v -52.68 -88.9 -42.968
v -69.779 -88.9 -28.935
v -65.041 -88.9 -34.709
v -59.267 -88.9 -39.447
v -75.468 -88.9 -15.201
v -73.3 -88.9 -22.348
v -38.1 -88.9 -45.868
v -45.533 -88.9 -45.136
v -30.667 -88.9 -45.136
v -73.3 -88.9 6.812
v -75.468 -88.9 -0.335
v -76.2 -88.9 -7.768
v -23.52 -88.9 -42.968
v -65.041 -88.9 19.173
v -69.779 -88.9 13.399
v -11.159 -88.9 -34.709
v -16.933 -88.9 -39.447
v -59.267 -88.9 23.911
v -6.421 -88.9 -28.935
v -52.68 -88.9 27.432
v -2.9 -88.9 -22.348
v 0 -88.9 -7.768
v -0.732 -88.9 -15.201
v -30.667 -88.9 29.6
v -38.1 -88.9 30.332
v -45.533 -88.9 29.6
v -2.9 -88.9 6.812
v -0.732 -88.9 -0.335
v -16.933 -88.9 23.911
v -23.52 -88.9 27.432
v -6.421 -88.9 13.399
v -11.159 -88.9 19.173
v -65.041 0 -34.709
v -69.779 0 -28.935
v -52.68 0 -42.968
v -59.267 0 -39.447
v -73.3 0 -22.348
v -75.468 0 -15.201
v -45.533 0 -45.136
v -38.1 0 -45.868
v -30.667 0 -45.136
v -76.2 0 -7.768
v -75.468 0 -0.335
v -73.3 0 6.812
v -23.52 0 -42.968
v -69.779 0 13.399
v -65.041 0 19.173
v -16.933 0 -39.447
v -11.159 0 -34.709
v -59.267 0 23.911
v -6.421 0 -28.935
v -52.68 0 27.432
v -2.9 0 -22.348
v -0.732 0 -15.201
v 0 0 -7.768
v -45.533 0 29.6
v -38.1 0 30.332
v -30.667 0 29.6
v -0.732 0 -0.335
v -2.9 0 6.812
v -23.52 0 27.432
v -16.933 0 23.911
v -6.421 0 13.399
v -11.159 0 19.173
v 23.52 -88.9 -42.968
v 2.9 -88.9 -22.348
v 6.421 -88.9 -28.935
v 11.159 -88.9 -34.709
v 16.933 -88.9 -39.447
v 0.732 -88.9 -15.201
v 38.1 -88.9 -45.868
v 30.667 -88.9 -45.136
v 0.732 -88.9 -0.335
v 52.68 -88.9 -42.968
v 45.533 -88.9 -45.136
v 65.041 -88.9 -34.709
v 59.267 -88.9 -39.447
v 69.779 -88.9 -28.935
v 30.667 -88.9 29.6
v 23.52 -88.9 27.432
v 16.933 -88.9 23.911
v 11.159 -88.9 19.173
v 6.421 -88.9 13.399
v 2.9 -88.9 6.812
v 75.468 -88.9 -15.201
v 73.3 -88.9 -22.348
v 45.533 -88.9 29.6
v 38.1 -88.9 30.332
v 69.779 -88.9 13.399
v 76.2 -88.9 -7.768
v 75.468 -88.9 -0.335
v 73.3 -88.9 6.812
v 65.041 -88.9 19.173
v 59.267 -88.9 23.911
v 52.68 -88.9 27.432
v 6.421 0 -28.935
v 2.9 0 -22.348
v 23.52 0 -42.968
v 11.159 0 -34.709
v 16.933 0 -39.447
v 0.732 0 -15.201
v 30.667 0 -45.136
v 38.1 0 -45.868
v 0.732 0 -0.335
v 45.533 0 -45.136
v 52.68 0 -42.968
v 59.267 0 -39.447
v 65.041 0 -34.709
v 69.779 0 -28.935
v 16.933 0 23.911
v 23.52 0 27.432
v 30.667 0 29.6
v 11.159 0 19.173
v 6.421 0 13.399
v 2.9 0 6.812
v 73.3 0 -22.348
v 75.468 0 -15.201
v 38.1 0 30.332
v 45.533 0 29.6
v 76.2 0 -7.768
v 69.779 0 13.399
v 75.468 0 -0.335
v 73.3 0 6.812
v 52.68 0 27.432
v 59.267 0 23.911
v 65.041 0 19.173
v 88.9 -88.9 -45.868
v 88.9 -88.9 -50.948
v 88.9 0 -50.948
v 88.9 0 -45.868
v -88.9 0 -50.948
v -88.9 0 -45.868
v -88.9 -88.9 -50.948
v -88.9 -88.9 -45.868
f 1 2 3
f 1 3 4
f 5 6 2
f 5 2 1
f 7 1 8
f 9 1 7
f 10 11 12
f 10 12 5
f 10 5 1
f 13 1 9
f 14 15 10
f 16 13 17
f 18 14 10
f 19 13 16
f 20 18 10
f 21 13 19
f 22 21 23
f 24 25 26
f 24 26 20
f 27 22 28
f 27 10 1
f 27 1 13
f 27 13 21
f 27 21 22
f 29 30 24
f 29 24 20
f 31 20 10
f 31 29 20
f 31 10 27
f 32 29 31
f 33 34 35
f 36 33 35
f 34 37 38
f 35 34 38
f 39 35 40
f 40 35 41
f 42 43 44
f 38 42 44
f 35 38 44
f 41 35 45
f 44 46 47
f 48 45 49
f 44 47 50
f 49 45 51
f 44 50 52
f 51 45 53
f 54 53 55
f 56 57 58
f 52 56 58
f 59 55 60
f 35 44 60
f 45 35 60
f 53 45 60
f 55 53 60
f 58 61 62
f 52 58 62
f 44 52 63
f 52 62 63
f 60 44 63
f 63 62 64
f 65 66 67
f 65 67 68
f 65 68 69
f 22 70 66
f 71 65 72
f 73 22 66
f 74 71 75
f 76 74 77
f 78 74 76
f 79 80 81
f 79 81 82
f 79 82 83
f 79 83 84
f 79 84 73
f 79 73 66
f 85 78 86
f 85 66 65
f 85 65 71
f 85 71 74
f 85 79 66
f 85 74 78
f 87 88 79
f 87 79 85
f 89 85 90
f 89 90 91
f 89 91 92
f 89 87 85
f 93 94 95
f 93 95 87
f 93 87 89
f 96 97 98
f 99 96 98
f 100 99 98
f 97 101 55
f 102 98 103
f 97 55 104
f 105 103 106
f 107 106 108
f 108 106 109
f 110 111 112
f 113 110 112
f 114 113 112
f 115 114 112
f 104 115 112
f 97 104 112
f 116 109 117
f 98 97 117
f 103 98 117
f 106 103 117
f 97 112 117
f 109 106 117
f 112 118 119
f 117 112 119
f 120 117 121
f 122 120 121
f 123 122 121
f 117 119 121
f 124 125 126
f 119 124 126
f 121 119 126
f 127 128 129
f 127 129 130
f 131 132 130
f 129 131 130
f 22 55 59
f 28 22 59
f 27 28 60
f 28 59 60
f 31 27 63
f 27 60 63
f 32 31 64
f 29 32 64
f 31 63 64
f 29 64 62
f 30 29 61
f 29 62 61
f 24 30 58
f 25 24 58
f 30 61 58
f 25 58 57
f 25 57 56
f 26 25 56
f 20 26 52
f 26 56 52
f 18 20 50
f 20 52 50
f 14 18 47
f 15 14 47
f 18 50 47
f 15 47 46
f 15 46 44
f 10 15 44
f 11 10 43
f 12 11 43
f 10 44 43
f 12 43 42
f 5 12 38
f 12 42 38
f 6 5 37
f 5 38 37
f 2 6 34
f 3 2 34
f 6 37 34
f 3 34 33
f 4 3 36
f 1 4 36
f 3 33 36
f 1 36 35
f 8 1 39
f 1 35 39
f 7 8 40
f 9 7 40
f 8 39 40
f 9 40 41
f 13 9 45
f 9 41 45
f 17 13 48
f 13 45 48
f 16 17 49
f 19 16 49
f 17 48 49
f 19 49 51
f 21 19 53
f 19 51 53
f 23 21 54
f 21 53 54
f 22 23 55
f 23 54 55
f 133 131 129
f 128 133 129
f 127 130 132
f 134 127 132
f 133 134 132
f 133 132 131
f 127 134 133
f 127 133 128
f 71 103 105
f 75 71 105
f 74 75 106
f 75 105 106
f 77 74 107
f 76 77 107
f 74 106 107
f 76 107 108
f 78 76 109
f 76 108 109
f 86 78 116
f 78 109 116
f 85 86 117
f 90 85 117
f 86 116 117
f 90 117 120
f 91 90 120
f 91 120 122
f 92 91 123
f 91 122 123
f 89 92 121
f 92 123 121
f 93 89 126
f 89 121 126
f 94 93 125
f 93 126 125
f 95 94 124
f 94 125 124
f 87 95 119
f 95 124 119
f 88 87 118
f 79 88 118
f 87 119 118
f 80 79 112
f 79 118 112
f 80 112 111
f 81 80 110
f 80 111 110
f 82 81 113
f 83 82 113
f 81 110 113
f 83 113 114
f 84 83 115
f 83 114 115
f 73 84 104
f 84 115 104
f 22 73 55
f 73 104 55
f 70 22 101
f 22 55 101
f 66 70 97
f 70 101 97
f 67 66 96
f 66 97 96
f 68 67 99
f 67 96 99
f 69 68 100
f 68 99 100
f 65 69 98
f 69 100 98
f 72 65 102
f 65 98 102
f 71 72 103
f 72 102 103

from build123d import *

# Parameters (mm, degrees)
F1_DEPTH = 88.9


# Not quite as in the source:
# - a feature names something its author has since deleted; it is built from what else it names


with BuildPart() as f1:
    # F0 (on Front) → F1 (new body)
    with BuildSketch(Plane.XZ):
        with BuildLine():
            ThreePointArc((-38.1, -45.8680424225), (-11.1592316368, -34.7088107857), (0, -7.7680424225))
            ThreePointArc((0, -7.7680424225), (-65.0407683632, 19.1727259407), (-38.1, -45.8680424225))
        make_face()
    extrude(amount=F1_DEPTH)


with BuildPart() as f1b:
    # F0 (on Front) → F1, piece 2 (new body)
    with BuildSketch(Plane.XZ):
        with BuildLine():
            ThreePointArc((76.2, -7.7680424225), (38.1, 30.3319575775), (0, -7.7680424225))
            ThreePointArc((0, -7.7680424225), (11.1592316368, -34.7088107857), (38.1, -45.8680424225))
            ThreePointArc((38.1, -45.8680424225), (65.0407683632, -34.7088107857), (76.2, -7.7680424225))
        make_face()
    extrude(amount=F1_DEPTH)


with BuildPart() as f1c:
    # F0 (on Front) → F1, piece 3 (new body)
    with BuildSketch(Plane.XZ):
        Polygon((38.1, -45.8680424225), (-38.1, -45.8680424225), (-88.9, -45.8680424225), (-88.9, -50.9480424225), (88.9, -50.9480424225), (88.9, -45.8680424225), align=None)
    extrude(amount=F1_DEPTH)


solid = Compound([f1.part, f1b.part, f1c.part])
